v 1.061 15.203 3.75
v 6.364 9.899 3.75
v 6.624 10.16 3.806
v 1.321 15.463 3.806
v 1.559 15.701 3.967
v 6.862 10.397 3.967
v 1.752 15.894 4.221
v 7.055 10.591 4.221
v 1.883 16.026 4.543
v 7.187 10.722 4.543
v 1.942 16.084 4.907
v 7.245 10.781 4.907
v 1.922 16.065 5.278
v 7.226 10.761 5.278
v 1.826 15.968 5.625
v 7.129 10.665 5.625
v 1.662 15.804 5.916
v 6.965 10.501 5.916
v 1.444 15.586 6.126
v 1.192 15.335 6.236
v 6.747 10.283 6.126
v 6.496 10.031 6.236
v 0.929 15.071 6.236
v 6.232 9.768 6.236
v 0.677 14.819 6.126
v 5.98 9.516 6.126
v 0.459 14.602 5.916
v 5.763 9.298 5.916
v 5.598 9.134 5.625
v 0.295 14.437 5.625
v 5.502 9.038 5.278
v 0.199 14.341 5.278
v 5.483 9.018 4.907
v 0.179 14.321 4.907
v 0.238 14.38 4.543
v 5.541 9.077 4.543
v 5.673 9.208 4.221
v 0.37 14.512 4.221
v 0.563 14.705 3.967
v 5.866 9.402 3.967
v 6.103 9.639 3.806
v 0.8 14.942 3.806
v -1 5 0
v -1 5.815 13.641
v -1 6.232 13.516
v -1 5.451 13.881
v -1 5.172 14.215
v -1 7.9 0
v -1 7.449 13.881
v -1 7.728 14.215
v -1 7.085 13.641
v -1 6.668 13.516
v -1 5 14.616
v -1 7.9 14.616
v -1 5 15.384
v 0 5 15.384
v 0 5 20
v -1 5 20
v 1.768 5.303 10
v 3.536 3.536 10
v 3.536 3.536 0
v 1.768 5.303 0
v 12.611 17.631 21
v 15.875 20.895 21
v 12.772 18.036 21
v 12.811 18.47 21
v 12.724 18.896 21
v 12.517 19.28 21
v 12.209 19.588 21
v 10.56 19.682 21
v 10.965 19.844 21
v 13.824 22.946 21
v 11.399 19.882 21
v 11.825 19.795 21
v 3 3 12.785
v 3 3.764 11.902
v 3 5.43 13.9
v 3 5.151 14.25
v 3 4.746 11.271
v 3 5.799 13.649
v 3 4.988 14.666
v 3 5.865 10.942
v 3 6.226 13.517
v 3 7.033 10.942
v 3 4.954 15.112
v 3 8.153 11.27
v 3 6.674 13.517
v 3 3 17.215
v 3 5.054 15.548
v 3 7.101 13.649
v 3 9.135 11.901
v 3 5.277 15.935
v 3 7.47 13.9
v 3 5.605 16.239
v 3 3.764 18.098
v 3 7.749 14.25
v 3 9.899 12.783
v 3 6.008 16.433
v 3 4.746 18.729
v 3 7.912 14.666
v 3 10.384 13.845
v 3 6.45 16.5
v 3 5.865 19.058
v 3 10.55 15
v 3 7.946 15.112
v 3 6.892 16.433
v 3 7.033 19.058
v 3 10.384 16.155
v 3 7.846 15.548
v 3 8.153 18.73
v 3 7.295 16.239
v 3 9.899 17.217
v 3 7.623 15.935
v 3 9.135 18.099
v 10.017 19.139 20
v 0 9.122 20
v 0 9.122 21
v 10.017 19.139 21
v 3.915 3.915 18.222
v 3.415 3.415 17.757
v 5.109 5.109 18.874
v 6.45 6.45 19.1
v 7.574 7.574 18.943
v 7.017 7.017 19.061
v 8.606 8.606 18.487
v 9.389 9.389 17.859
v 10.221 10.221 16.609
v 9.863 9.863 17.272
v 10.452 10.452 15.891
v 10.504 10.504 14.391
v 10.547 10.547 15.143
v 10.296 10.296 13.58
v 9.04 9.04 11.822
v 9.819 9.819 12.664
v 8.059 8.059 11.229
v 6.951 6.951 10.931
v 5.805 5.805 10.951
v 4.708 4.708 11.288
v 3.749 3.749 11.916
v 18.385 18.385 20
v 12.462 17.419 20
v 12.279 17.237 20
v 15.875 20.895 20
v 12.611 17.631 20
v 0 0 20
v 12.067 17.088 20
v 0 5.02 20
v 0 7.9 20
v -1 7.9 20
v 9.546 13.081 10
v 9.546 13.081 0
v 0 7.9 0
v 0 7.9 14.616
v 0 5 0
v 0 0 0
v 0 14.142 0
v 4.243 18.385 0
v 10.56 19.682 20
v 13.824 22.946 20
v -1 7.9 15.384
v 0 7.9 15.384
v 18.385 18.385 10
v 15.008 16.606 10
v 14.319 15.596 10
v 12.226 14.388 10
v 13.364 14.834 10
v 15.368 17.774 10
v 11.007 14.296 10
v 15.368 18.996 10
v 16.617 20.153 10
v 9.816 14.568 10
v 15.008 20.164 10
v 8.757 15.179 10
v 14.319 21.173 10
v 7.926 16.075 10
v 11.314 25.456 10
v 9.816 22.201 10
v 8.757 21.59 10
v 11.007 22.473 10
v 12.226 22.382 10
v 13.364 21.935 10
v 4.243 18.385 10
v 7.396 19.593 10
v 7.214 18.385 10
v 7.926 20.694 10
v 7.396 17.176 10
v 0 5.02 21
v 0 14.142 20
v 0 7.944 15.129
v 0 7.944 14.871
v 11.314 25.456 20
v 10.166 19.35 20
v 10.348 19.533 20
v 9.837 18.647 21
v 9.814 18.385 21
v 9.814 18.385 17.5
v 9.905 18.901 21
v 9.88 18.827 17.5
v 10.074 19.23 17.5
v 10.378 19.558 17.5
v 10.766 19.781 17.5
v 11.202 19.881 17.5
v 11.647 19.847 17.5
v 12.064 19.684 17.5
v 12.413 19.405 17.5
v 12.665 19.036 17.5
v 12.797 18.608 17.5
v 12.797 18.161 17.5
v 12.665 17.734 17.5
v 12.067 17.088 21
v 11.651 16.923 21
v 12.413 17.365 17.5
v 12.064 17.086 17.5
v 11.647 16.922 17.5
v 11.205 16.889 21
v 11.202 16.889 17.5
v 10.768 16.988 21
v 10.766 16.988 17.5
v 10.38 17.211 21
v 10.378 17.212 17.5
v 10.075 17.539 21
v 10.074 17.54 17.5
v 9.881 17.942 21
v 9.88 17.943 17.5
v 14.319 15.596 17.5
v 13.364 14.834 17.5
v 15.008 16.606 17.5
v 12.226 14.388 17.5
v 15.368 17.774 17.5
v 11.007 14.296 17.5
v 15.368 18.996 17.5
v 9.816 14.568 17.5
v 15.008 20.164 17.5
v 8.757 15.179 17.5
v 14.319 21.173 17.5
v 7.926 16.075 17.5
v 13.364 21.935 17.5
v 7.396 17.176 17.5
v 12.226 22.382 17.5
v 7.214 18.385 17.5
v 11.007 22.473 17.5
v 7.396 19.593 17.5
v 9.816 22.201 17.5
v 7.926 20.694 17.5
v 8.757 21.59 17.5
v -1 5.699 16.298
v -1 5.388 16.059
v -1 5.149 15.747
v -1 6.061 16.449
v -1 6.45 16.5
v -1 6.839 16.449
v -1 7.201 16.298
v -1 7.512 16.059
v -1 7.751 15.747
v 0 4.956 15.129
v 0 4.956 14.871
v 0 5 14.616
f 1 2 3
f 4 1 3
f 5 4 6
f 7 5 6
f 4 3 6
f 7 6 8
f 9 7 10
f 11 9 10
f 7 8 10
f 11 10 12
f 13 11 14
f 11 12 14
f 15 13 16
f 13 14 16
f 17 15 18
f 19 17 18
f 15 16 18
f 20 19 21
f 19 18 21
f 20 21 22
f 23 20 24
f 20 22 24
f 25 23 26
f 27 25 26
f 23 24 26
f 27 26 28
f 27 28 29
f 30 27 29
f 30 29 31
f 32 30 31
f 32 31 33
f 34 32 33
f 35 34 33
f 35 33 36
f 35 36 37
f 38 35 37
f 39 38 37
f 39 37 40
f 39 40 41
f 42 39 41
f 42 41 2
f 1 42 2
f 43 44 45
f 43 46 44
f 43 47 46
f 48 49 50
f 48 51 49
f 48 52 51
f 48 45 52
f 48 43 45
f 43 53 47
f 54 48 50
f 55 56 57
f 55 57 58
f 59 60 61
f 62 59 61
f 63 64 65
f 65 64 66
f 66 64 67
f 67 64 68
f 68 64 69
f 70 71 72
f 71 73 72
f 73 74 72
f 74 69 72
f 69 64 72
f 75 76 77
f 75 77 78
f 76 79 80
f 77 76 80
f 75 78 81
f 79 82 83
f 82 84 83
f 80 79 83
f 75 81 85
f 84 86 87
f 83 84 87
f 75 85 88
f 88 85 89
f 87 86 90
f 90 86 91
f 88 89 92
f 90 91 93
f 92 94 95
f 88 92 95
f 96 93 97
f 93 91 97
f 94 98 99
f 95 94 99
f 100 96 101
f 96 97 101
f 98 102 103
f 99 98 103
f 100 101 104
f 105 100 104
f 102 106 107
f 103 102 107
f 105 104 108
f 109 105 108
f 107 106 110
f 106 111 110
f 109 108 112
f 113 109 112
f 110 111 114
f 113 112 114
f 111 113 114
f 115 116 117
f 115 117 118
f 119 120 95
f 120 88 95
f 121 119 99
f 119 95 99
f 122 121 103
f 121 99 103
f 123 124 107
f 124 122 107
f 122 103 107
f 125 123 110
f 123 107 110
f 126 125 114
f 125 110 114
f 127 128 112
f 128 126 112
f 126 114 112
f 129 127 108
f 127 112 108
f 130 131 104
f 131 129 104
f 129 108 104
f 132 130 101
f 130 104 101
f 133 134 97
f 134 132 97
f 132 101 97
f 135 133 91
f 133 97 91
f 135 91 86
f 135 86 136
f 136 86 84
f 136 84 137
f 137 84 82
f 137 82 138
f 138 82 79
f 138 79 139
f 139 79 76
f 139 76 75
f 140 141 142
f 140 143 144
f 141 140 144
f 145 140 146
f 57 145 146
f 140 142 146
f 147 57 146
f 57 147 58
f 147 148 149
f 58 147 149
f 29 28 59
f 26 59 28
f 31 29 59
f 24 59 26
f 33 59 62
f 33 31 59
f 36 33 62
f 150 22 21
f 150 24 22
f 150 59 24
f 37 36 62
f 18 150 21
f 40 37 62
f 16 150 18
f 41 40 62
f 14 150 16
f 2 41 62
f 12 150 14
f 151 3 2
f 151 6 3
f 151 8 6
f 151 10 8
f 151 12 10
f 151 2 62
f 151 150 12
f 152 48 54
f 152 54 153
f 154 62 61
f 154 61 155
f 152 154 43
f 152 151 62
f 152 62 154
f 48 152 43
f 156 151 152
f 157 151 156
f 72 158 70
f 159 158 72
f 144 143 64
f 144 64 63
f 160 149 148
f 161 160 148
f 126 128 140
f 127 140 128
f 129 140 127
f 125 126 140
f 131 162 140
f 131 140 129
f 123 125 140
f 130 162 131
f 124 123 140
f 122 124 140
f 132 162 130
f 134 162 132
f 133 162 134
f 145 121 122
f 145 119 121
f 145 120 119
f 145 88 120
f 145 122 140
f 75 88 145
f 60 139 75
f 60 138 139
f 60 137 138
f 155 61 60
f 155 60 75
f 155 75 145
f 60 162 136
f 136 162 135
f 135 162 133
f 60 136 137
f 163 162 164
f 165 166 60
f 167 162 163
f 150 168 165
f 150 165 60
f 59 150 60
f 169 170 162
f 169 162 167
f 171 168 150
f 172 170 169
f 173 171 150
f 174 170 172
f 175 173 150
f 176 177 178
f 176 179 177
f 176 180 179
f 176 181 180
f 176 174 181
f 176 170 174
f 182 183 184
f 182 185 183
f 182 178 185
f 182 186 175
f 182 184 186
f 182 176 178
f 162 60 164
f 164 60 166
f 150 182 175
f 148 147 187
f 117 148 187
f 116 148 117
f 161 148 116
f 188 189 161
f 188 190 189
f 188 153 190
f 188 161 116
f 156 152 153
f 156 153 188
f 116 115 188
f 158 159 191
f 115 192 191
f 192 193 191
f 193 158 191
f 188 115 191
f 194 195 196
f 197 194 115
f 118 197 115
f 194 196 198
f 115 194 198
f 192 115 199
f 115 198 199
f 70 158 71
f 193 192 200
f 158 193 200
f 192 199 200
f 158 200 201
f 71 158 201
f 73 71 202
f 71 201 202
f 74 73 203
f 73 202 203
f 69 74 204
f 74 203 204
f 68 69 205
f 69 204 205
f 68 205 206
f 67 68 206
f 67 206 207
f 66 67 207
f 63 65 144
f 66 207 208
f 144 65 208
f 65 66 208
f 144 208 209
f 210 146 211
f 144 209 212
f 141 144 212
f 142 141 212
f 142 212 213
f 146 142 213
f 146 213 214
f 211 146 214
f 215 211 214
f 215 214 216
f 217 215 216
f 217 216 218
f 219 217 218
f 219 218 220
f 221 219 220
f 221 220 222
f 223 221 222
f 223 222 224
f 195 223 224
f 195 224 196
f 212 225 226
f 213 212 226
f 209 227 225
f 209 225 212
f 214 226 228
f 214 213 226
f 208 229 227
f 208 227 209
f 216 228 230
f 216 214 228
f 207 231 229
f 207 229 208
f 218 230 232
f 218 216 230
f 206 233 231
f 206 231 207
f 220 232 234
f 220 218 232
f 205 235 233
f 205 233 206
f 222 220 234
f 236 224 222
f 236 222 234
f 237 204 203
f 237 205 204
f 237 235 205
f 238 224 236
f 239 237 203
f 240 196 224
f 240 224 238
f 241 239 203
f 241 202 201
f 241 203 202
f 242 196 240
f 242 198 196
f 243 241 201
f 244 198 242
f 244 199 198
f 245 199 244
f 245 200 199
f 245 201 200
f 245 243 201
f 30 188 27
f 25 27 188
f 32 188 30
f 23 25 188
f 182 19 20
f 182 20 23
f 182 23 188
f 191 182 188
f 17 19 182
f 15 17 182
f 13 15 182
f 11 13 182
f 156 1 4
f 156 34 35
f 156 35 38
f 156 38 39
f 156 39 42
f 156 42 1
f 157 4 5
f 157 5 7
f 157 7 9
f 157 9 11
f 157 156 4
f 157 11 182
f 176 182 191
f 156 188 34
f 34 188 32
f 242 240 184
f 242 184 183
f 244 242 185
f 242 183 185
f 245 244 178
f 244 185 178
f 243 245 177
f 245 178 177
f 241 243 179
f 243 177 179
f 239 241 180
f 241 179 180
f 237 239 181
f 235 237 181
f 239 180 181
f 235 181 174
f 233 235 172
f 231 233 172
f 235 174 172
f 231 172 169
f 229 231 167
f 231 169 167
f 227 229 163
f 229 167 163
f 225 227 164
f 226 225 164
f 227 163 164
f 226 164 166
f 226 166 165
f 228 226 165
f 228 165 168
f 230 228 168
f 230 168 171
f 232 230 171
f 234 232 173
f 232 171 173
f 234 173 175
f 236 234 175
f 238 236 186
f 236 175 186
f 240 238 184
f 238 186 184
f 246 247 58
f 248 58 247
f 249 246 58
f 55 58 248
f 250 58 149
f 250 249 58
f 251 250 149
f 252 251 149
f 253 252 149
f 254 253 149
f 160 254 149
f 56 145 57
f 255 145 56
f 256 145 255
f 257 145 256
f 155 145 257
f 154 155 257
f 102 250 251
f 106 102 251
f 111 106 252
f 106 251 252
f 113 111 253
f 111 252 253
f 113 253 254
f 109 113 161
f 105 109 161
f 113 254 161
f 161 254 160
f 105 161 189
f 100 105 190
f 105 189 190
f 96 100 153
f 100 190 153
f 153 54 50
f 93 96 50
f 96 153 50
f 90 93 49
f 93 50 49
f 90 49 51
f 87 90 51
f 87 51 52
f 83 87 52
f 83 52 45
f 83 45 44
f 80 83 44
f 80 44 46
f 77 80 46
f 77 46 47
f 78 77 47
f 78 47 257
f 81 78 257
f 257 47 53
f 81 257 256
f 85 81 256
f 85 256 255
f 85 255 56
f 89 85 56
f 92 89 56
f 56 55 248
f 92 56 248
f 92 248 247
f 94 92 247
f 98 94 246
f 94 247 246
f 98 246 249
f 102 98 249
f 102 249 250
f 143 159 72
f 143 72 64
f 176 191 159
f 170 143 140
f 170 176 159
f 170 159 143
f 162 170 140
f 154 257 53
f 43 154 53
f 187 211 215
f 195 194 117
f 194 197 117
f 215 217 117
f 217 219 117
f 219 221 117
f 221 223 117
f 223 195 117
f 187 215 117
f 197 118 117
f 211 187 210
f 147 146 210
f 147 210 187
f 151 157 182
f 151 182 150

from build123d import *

# Parameters (mm, degrees)
BOSS_EXTRU_1_DEPTH       = 20
ESQUISSE2_W              = 10
ESQUISSE2_H              = 21
ENL_V_MAT_EXTRU_1_DEPTH  = 2.5
ESQUISSE3_R              = 1.5
ENL_V_MAT_EXTRU_2_DEPTH  = 20.384776311
ESQUISSE4_R              = 4.1
ENL_V_MAT_EXTRU_3_DEPTH  = 16.384776311
ESQUISSE5_R              = 1.25
ENL_V_MAT_EXTRU_4_DEPTH  = 17.207106781
BOSS_EXTRU_2_DEPTH       = 1
ENL_V_MAT_EXTRU_7_DEPTH  = 11
ENL_V_MAT_EXTRU_8_DEPTH  = 11
ESQUISSE11_R             = 1.5
ENL_V_MAT_EXTRU_9_DEPTH  = 12
ESQUISSE12_R             = 4.1
ENL_V_MAT_EXTRU_10_DEPTH = 7.5


with BuildPart() as part:
    # Esquisse1 → Boss.-Extru.1 (new body)
    with BuildSketch(Plane.XY):
        Polygon((0, 0), (0, 5), (-1, 5), (-1, 7.9), (0, 7.9), (0, 14.142135624), (11.313708499, 25.455844123), (18.384776311, 18.384776311), align=None)
    extrude(amount=BOSS_EXTRU_1_DEPTH)

    # Esquisse2 → Enlèv. mat.-Extru.1 (cut)
    with BuildSketch(Plane(origin=(0, 0, 0), x_dir=(0, 0, -1), z_dir=(0.707106781, -0.707106781, 0))):
        with Locations((-5, 15.5)):
            Rectangle(ESQUISSE2_W, ESQUISSE2_H)
    extrude(amount=-ENL_V_MAT_EXTRU_1_DEPTH, mode=Mode.SUBTRACT)

    # Esquisse3 → Enlèv. mat.-Extru.2 (cut, through all)
    with BuildSketch(Plane.ZY.offset(1)):
        with Locations((15, 6.45)):
            Circle(ESQUISSE3_R)
    extrude(amount=-ENL_V_MAT_EXTRU_2_DEPTH, mode=Mode.SUBTRACT)

    # Esquisse4 → Enlèv. mat.-Extru.3 (cut, through all)
    with BuildSketch(Plane.ZY.offset(-3)):
        with Locations((15, 6.45)):
            Circle(ESQUISSE4_R)
    extrude(amount=-ENL_V_MAT_EXTRU_3_DEPTH, mode=Mode.SUBTRACT)

    # Esquisse5 → Enlèv. mat.-Extru.4 (cut, through all)
    with BuildSketch(Plane(origin=(-1.767766953, 1.767766953, 0), x_dir=(0, 0, -1), z_dir=(0.707106781, -0.707106781, 0))):
        with Locations((-5, 11.5)):
            Circle(ESQUISSE5_R)
    extrude(amount=-ENL_V_MAT_EXTRU_4_DEPTH, mode=Mode.SUBTRACT)

    # Esquisse6 → Boss.-Extru.2 (add)
    with BuildSketch(Plane.XY.offset(20)):
        Polygon((0, 9.121677477), (13.823937572, 22.94561505), (15.874547238, 20.895005384), (0, 5.020458146), align=None)
    extrude(amount=BOSS_EXTRU_2_DEPTH)

    # Esquisse9 → Enlèv. mat.-Extru.7 (cut, through all)
    with BuildSketch(Plane(origin=(0, 0, 10), x_dir=(-1, 0, 0), z_dir=(0, 0, -1))):
        Polygon((-18.384776311, 18.384776311), (-12.02081528, 12.02081528), (-4.949747468, 19.091883092), (-11.313708499, 25.455844123), align=None)
    extrude(amount=ENL_V_MAT_EXTRU_7_DEPTH, mode=Mode.SUBTRACT)

    # Esquisse10 → Enlèv. mat.-Extru.8 (cut, through all)
    with BuildSketch(Plane(origin=(0, 0, 10), x_dir=(-1, 0, 0), z_dir=(0, 0, -1))):
        Polygon((-11.313708499, 25.455844123), (-4.242640687, 18.384776311), (-11.313708499, 11.313708499), (-18.384776311, 18.384776311), align=None)
    extrude(amount=ENL_V_MAT_EXTRU_8_DEPTH, mode=Mode.SUBTRACT)

    # Esquisse11 → Enlèv. mat.-Extru.9 (cut, through all)
    with BuildSketch(Plane(origin=(0, 0, 10), x_dir=(-1, 0, 0), z_dir=(0, 0, -1))):
        with Locations((-11.313708499, 18.384776311)):
            Circle(ESQUISSE11_R)
    extrude(amount=-ENL_V_MAT_EXTRU_9_DEPTH, mode=Mode.SUBTRACT)

    # Esquisse12 → Enlèv. mat.-Extru.10 (cut)
    with BuildSketch(Plane(origin=(0, 0, 10), x_dir=(-1, 0, 0), z_dir=(0, 0, -1))):
        with Locations((-11.313708499, 18.384776311)):
            Circle(ESQUISSE12_R)
    extrude(amount=-ENL_V_MAT_EXTRU_10_DEPTH, mode=Mode.SUBTRACT)


solid = part.part
